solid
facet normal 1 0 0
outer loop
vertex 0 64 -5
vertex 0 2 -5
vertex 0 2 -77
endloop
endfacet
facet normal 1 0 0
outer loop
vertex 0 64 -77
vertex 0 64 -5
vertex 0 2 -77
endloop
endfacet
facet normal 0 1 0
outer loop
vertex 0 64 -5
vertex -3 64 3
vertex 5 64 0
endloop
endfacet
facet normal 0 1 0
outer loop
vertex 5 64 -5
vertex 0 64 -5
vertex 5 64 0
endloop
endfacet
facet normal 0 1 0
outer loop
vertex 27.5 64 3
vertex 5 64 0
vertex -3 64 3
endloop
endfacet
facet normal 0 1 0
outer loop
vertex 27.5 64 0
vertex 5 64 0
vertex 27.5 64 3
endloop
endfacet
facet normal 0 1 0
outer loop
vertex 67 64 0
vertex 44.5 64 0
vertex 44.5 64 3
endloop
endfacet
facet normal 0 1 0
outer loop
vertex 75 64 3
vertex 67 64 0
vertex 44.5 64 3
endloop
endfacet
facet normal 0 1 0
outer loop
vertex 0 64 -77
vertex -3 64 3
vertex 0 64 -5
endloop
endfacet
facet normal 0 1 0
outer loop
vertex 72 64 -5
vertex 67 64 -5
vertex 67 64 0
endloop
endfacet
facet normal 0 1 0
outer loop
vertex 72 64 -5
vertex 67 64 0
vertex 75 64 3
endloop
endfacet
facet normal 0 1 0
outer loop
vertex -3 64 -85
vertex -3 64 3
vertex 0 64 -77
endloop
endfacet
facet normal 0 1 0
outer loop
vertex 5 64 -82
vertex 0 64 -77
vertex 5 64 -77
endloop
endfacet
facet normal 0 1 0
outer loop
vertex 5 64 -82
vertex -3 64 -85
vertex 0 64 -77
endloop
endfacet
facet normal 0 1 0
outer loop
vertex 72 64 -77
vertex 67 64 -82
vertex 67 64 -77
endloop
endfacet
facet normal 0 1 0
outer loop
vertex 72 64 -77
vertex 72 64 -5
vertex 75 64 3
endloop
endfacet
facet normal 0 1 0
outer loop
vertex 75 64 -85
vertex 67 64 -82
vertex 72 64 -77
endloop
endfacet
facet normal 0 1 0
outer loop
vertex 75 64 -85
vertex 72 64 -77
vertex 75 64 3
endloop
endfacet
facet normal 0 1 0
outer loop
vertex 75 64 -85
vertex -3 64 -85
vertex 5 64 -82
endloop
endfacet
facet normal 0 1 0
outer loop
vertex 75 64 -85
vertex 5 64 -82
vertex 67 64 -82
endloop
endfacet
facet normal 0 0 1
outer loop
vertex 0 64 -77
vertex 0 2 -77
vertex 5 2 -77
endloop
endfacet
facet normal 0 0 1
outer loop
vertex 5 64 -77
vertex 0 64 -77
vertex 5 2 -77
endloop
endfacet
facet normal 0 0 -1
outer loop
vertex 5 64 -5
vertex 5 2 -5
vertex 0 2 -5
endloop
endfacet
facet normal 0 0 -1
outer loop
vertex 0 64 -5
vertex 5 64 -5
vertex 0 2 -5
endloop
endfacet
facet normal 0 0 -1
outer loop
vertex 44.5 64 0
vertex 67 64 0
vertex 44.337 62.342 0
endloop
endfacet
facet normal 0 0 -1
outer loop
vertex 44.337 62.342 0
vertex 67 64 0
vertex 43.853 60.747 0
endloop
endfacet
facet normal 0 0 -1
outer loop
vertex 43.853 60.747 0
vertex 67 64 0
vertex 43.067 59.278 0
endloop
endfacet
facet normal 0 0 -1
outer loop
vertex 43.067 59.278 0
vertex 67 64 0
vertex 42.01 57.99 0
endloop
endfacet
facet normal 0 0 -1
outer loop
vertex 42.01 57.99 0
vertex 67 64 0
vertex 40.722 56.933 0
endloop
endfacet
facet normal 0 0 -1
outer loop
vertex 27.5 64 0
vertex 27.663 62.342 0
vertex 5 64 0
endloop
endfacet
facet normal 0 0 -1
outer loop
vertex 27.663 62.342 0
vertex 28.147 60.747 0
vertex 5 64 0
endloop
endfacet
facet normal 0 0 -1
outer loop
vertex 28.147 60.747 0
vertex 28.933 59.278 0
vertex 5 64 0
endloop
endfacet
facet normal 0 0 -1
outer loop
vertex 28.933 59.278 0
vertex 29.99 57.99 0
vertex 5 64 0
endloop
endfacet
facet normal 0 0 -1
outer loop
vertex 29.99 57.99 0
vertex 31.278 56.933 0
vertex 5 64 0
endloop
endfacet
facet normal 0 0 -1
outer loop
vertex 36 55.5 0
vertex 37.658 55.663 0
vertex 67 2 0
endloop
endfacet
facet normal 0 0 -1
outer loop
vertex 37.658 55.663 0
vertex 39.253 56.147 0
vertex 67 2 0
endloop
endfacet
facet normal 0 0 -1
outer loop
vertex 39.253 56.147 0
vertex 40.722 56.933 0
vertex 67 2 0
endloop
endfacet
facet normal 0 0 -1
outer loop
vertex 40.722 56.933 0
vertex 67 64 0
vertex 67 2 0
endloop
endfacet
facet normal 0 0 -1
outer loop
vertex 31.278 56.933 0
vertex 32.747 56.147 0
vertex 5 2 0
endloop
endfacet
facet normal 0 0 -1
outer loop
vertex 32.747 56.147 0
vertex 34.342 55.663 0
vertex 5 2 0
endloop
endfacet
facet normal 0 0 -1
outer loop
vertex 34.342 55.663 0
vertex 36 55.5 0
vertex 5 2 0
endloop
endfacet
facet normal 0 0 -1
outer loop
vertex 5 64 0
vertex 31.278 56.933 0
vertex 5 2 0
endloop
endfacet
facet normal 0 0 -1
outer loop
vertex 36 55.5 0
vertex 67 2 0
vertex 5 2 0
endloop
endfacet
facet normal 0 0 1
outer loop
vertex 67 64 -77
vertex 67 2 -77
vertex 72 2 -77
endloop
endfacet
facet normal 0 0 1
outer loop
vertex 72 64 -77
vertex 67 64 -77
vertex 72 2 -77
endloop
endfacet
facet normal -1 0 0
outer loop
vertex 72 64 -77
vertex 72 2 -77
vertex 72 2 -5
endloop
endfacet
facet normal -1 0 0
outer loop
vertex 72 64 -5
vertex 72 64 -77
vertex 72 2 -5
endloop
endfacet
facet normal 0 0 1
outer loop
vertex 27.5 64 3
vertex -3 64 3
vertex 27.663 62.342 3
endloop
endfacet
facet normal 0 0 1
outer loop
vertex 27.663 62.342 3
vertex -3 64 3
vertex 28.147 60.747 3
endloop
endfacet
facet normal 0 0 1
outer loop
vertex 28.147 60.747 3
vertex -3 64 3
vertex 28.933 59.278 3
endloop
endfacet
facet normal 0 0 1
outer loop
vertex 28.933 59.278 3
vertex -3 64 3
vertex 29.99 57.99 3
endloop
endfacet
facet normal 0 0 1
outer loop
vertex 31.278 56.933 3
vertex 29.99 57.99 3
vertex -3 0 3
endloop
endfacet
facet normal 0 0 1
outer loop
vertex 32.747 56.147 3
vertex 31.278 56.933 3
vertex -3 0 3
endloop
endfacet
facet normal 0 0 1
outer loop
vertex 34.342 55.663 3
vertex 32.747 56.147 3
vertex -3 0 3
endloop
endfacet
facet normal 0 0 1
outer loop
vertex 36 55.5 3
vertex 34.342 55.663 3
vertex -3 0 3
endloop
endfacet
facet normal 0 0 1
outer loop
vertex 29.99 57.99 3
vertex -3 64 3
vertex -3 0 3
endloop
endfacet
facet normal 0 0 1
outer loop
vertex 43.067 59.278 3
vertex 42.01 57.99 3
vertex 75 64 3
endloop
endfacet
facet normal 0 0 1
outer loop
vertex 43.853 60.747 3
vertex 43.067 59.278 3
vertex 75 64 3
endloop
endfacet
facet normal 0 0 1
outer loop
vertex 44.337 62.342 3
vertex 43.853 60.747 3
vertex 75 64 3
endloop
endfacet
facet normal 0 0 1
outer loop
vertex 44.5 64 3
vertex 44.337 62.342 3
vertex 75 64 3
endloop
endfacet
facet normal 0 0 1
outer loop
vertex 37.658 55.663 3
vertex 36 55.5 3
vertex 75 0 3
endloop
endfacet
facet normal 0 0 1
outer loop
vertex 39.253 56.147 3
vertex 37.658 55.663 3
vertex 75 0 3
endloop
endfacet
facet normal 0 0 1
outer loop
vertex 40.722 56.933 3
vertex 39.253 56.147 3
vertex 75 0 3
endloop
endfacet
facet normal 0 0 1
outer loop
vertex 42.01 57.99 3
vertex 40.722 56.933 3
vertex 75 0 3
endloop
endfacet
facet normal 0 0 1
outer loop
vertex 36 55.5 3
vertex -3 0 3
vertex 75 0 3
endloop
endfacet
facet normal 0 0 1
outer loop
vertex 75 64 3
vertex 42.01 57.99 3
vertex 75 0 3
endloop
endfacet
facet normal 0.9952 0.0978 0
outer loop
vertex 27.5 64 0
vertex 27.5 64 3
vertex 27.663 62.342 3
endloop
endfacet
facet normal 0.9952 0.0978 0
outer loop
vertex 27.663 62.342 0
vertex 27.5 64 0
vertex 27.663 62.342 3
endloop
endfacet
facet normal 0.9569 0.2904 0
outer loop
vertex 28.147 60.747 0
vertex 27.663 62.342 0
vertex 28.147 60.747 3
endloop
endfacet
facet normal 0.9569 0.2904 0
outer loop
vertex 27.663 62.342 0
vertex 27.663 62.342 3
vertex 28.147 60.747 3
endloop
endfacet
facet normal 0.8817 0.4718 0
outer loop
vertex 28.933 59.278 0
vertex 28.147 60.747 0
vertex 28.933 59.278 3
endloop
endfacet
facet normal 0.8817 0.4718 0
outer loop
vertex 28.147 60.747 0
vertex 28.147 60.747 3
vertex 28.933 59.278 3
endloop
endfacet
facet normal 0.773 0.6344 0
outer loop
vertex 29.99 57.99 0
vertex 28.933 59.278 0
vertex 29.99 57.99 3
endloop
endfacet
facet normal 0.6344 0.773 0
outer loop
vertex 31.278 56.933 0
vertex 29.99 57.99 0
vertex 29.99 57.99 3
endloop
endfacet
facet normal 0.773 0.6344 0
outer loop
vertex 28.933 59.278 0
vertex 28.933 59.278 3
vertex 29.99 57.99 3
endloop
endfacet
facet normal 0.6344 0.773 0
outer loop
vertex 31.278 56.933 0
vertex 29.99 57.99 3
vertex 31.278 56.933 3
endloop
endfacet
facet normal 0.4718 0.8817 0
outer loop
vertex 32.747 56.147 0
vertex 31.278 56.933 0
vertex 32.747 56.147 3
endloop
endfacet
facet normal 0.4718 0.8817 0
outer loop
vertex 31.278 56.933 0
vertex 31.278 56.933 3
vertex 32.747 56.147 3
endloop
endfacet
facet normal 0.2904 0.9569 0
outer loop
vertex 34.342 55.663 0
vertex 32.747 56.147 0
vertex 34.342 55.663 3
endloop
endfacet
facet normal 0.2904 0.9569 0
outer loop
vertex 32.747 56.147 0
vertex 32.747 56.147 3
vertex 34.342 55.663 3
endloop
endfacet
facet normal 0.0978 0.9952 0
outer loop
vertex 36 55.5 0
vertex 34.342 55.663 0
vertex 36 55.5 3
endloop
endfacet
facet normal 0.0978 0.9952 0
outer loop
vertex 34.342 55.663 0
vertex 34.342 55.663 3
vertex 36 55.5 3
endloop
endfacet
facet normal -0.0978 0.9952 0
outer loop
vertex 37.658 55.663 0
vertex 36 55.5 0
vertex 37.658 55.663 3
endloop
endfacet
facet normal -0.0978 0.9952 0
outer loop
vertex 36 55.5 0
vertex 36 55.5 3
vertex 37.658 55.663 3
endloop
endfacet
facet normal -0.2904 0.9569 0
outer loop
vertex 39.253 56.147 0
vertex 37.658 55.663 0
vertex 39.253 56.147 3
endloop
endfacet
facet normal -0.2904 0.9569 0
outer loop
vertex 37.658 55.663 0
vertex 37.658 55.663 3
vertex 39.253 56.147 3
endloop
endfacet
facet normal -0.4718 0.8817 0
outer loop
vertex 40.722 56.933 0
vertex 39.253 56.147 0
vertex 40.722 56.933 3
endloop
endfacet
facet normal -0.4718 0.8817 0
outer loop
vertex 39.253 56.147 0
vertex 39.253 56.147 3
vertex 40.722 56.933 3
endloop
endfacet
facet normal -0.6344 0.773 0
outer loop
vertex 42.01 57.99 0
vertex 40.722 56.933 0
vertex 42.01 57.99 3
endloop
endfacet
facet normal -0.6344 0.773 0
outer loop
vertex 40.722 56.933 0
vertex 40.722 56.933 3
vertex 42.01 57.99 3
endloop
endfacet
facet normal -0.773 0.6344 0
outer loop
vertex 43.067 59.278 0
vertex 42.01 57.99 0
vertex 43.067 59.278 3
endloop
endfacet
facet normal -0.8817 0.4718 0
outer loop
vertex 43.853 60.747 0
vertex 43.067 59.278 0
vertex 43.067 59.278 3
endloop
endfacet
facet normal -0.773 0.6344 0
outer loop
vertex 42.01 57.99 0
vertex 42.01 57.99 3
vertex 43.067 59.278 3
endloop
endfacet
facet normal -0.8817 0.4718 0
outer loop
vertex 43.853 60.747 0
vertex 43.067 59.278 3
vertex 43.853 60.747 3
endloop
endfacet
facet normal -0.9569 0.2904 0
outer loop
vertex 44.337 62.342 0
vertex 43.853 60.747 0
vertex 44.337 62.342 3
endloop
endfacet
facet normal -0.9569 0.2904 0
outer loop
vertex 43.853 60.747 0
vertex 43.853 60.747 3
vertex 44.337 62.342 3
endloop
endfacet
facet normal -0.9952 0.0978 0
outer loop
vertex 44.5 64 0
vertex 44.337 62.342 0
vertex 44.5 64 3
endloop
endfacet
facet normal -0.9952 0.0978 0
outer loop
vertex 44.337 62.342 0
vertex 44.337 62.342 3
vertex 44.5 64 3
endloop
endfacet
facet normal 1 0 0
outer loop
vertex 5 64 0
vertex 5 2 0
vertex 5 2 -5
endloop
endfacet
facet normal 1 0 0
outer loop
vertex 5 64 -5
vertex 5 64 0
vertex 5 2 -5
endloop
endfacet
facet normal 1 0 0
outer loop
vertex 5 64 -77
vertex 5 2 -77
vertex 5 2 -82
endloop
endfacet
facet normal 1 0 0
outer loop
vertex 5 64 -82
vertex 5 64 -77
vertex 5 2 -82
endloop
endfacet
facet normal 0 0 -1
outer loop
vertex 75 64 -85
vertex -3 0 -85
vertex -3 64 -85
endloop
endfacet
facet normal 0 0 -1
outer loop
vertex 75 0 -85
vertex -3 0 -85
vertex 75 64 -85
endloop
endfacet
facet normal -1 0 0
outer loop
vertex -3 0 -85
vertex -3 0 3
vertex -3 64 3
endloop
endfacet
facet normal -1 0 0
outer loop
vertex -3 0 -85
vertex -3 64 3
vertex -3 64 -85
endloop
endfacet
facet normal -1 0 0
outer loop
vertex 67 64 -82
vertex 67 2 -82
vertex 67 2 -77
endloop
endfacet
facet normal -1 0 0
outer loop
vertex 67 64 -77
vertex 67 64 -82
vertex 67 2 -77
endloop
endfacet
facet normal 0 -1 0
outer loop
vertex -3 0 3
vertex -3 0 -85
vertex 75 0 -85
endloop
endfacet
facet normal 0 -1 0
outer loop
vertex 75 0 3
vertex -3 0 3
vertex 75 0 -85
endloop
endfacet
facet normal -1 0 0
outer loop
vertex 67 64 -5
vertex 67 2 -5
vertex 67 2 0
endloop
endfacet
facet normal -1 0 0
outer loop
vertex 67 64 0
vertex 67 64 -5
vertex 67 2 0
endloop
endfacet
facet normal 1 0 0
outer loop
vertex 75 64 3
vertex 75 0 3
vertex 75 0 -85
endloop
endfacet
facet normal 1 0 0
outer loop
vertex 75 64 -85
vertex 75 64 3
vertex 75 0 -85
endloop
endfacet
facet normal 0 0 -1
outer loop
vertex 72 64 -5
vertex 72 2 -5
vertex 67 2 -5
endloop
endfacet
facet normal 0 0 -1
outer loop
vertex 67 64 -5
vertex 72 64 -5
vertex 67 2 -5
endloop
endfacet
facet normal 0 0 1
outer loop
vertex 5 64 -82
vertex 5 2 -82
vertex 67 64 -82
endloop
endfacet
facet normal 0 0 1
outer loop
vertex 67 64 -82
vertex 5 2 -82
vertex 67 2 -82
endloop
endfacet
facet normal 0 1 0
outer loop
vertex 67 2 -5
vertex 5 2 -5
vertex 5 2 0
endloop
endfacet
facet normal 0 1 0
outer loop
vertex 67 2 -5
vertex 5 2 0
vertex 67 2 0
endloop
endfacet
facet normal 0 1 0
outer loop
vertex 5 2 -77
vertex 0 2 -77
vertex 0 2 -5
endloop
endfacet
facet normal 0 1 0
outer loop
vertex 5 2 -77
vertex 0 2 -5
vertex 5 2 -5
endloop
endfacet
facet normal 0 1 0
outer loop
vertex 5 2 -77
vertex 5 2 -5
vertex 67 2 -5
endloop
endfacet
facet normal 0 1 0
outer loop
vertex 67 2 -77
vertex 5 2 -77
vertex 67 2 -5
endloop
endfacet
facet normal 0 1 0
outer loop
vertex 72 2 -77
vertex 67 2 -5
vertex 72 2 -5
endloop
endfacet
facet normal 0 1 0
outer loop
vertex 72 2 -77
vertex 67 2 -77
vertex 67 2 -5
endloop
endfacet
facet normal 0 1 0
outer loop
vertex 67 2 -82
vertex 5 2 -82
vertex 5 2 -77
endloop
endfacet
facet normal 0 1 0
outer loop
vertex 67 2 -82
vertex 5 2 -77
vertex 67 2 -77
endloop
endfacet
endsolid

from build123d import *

# Parameters (mm, degrees)
SKETCH1_W           = 72
SKETCH1_H           = 82
BOSS_EXTRUDE1_DEPTH = 2
BOSS_EXTRUDE2_START = -2
SKETCH2_W           = 78
SKETCH2_H           = 88
BOSS_EXTRUDE2_DEPTH = 64
SKETCH4_R           = 8.5
CUT_EXTRUDE1_DEPTH  = 3


with BuildPart() as part:
    # Sketch1 → Boss-Extrude1 (new body)
    with BuildSketch(Plane(origin=(0, 0, 0), x_dir=(1, 0, 0), z_dir=(0, 1, 0))):
        with Locations((36, 41)):
            Rectangle(SKETCH1_W, SKETCH1_H)
    extrude(amount=BOSS_EXTRUDE1_DEPTH)

    # Sketch2 → Boss-Extrude2 (add)
    with BuildSketch(Plane(origin=(0, 2, 0), x_dir=(1, 0, 0), z_dir=(0, 1, 0)).offset(BOSS_EXTRUDE2_START)):
        with Locations((36, 41)):
            Rectangle(SKETCH2_W, SKETCH2_H)
        Polygon((5, 82), (67, 82), (67, 77), (72, 77), (72, 5), (67, 5), (67, 0), (5, 0), (5, 5), (0, 5), (0, 77), (5, 77), align=None, mode=Mode.SUBTRACT)
    extrude(amount=BOSS_EXTRUDE2_DEPTH)

    # Sketch4 → Cut-Extrude1 (cut)
    with BuildSketch(Plane.XY.offset(3)):
        with Locations((36, 64)):
            Circle(SKETCH4_R)
    extrude(amount=-CUT_EXTRUDE1_DEPTH, mode=Mode.SUBTRACT)


solid = part.part
